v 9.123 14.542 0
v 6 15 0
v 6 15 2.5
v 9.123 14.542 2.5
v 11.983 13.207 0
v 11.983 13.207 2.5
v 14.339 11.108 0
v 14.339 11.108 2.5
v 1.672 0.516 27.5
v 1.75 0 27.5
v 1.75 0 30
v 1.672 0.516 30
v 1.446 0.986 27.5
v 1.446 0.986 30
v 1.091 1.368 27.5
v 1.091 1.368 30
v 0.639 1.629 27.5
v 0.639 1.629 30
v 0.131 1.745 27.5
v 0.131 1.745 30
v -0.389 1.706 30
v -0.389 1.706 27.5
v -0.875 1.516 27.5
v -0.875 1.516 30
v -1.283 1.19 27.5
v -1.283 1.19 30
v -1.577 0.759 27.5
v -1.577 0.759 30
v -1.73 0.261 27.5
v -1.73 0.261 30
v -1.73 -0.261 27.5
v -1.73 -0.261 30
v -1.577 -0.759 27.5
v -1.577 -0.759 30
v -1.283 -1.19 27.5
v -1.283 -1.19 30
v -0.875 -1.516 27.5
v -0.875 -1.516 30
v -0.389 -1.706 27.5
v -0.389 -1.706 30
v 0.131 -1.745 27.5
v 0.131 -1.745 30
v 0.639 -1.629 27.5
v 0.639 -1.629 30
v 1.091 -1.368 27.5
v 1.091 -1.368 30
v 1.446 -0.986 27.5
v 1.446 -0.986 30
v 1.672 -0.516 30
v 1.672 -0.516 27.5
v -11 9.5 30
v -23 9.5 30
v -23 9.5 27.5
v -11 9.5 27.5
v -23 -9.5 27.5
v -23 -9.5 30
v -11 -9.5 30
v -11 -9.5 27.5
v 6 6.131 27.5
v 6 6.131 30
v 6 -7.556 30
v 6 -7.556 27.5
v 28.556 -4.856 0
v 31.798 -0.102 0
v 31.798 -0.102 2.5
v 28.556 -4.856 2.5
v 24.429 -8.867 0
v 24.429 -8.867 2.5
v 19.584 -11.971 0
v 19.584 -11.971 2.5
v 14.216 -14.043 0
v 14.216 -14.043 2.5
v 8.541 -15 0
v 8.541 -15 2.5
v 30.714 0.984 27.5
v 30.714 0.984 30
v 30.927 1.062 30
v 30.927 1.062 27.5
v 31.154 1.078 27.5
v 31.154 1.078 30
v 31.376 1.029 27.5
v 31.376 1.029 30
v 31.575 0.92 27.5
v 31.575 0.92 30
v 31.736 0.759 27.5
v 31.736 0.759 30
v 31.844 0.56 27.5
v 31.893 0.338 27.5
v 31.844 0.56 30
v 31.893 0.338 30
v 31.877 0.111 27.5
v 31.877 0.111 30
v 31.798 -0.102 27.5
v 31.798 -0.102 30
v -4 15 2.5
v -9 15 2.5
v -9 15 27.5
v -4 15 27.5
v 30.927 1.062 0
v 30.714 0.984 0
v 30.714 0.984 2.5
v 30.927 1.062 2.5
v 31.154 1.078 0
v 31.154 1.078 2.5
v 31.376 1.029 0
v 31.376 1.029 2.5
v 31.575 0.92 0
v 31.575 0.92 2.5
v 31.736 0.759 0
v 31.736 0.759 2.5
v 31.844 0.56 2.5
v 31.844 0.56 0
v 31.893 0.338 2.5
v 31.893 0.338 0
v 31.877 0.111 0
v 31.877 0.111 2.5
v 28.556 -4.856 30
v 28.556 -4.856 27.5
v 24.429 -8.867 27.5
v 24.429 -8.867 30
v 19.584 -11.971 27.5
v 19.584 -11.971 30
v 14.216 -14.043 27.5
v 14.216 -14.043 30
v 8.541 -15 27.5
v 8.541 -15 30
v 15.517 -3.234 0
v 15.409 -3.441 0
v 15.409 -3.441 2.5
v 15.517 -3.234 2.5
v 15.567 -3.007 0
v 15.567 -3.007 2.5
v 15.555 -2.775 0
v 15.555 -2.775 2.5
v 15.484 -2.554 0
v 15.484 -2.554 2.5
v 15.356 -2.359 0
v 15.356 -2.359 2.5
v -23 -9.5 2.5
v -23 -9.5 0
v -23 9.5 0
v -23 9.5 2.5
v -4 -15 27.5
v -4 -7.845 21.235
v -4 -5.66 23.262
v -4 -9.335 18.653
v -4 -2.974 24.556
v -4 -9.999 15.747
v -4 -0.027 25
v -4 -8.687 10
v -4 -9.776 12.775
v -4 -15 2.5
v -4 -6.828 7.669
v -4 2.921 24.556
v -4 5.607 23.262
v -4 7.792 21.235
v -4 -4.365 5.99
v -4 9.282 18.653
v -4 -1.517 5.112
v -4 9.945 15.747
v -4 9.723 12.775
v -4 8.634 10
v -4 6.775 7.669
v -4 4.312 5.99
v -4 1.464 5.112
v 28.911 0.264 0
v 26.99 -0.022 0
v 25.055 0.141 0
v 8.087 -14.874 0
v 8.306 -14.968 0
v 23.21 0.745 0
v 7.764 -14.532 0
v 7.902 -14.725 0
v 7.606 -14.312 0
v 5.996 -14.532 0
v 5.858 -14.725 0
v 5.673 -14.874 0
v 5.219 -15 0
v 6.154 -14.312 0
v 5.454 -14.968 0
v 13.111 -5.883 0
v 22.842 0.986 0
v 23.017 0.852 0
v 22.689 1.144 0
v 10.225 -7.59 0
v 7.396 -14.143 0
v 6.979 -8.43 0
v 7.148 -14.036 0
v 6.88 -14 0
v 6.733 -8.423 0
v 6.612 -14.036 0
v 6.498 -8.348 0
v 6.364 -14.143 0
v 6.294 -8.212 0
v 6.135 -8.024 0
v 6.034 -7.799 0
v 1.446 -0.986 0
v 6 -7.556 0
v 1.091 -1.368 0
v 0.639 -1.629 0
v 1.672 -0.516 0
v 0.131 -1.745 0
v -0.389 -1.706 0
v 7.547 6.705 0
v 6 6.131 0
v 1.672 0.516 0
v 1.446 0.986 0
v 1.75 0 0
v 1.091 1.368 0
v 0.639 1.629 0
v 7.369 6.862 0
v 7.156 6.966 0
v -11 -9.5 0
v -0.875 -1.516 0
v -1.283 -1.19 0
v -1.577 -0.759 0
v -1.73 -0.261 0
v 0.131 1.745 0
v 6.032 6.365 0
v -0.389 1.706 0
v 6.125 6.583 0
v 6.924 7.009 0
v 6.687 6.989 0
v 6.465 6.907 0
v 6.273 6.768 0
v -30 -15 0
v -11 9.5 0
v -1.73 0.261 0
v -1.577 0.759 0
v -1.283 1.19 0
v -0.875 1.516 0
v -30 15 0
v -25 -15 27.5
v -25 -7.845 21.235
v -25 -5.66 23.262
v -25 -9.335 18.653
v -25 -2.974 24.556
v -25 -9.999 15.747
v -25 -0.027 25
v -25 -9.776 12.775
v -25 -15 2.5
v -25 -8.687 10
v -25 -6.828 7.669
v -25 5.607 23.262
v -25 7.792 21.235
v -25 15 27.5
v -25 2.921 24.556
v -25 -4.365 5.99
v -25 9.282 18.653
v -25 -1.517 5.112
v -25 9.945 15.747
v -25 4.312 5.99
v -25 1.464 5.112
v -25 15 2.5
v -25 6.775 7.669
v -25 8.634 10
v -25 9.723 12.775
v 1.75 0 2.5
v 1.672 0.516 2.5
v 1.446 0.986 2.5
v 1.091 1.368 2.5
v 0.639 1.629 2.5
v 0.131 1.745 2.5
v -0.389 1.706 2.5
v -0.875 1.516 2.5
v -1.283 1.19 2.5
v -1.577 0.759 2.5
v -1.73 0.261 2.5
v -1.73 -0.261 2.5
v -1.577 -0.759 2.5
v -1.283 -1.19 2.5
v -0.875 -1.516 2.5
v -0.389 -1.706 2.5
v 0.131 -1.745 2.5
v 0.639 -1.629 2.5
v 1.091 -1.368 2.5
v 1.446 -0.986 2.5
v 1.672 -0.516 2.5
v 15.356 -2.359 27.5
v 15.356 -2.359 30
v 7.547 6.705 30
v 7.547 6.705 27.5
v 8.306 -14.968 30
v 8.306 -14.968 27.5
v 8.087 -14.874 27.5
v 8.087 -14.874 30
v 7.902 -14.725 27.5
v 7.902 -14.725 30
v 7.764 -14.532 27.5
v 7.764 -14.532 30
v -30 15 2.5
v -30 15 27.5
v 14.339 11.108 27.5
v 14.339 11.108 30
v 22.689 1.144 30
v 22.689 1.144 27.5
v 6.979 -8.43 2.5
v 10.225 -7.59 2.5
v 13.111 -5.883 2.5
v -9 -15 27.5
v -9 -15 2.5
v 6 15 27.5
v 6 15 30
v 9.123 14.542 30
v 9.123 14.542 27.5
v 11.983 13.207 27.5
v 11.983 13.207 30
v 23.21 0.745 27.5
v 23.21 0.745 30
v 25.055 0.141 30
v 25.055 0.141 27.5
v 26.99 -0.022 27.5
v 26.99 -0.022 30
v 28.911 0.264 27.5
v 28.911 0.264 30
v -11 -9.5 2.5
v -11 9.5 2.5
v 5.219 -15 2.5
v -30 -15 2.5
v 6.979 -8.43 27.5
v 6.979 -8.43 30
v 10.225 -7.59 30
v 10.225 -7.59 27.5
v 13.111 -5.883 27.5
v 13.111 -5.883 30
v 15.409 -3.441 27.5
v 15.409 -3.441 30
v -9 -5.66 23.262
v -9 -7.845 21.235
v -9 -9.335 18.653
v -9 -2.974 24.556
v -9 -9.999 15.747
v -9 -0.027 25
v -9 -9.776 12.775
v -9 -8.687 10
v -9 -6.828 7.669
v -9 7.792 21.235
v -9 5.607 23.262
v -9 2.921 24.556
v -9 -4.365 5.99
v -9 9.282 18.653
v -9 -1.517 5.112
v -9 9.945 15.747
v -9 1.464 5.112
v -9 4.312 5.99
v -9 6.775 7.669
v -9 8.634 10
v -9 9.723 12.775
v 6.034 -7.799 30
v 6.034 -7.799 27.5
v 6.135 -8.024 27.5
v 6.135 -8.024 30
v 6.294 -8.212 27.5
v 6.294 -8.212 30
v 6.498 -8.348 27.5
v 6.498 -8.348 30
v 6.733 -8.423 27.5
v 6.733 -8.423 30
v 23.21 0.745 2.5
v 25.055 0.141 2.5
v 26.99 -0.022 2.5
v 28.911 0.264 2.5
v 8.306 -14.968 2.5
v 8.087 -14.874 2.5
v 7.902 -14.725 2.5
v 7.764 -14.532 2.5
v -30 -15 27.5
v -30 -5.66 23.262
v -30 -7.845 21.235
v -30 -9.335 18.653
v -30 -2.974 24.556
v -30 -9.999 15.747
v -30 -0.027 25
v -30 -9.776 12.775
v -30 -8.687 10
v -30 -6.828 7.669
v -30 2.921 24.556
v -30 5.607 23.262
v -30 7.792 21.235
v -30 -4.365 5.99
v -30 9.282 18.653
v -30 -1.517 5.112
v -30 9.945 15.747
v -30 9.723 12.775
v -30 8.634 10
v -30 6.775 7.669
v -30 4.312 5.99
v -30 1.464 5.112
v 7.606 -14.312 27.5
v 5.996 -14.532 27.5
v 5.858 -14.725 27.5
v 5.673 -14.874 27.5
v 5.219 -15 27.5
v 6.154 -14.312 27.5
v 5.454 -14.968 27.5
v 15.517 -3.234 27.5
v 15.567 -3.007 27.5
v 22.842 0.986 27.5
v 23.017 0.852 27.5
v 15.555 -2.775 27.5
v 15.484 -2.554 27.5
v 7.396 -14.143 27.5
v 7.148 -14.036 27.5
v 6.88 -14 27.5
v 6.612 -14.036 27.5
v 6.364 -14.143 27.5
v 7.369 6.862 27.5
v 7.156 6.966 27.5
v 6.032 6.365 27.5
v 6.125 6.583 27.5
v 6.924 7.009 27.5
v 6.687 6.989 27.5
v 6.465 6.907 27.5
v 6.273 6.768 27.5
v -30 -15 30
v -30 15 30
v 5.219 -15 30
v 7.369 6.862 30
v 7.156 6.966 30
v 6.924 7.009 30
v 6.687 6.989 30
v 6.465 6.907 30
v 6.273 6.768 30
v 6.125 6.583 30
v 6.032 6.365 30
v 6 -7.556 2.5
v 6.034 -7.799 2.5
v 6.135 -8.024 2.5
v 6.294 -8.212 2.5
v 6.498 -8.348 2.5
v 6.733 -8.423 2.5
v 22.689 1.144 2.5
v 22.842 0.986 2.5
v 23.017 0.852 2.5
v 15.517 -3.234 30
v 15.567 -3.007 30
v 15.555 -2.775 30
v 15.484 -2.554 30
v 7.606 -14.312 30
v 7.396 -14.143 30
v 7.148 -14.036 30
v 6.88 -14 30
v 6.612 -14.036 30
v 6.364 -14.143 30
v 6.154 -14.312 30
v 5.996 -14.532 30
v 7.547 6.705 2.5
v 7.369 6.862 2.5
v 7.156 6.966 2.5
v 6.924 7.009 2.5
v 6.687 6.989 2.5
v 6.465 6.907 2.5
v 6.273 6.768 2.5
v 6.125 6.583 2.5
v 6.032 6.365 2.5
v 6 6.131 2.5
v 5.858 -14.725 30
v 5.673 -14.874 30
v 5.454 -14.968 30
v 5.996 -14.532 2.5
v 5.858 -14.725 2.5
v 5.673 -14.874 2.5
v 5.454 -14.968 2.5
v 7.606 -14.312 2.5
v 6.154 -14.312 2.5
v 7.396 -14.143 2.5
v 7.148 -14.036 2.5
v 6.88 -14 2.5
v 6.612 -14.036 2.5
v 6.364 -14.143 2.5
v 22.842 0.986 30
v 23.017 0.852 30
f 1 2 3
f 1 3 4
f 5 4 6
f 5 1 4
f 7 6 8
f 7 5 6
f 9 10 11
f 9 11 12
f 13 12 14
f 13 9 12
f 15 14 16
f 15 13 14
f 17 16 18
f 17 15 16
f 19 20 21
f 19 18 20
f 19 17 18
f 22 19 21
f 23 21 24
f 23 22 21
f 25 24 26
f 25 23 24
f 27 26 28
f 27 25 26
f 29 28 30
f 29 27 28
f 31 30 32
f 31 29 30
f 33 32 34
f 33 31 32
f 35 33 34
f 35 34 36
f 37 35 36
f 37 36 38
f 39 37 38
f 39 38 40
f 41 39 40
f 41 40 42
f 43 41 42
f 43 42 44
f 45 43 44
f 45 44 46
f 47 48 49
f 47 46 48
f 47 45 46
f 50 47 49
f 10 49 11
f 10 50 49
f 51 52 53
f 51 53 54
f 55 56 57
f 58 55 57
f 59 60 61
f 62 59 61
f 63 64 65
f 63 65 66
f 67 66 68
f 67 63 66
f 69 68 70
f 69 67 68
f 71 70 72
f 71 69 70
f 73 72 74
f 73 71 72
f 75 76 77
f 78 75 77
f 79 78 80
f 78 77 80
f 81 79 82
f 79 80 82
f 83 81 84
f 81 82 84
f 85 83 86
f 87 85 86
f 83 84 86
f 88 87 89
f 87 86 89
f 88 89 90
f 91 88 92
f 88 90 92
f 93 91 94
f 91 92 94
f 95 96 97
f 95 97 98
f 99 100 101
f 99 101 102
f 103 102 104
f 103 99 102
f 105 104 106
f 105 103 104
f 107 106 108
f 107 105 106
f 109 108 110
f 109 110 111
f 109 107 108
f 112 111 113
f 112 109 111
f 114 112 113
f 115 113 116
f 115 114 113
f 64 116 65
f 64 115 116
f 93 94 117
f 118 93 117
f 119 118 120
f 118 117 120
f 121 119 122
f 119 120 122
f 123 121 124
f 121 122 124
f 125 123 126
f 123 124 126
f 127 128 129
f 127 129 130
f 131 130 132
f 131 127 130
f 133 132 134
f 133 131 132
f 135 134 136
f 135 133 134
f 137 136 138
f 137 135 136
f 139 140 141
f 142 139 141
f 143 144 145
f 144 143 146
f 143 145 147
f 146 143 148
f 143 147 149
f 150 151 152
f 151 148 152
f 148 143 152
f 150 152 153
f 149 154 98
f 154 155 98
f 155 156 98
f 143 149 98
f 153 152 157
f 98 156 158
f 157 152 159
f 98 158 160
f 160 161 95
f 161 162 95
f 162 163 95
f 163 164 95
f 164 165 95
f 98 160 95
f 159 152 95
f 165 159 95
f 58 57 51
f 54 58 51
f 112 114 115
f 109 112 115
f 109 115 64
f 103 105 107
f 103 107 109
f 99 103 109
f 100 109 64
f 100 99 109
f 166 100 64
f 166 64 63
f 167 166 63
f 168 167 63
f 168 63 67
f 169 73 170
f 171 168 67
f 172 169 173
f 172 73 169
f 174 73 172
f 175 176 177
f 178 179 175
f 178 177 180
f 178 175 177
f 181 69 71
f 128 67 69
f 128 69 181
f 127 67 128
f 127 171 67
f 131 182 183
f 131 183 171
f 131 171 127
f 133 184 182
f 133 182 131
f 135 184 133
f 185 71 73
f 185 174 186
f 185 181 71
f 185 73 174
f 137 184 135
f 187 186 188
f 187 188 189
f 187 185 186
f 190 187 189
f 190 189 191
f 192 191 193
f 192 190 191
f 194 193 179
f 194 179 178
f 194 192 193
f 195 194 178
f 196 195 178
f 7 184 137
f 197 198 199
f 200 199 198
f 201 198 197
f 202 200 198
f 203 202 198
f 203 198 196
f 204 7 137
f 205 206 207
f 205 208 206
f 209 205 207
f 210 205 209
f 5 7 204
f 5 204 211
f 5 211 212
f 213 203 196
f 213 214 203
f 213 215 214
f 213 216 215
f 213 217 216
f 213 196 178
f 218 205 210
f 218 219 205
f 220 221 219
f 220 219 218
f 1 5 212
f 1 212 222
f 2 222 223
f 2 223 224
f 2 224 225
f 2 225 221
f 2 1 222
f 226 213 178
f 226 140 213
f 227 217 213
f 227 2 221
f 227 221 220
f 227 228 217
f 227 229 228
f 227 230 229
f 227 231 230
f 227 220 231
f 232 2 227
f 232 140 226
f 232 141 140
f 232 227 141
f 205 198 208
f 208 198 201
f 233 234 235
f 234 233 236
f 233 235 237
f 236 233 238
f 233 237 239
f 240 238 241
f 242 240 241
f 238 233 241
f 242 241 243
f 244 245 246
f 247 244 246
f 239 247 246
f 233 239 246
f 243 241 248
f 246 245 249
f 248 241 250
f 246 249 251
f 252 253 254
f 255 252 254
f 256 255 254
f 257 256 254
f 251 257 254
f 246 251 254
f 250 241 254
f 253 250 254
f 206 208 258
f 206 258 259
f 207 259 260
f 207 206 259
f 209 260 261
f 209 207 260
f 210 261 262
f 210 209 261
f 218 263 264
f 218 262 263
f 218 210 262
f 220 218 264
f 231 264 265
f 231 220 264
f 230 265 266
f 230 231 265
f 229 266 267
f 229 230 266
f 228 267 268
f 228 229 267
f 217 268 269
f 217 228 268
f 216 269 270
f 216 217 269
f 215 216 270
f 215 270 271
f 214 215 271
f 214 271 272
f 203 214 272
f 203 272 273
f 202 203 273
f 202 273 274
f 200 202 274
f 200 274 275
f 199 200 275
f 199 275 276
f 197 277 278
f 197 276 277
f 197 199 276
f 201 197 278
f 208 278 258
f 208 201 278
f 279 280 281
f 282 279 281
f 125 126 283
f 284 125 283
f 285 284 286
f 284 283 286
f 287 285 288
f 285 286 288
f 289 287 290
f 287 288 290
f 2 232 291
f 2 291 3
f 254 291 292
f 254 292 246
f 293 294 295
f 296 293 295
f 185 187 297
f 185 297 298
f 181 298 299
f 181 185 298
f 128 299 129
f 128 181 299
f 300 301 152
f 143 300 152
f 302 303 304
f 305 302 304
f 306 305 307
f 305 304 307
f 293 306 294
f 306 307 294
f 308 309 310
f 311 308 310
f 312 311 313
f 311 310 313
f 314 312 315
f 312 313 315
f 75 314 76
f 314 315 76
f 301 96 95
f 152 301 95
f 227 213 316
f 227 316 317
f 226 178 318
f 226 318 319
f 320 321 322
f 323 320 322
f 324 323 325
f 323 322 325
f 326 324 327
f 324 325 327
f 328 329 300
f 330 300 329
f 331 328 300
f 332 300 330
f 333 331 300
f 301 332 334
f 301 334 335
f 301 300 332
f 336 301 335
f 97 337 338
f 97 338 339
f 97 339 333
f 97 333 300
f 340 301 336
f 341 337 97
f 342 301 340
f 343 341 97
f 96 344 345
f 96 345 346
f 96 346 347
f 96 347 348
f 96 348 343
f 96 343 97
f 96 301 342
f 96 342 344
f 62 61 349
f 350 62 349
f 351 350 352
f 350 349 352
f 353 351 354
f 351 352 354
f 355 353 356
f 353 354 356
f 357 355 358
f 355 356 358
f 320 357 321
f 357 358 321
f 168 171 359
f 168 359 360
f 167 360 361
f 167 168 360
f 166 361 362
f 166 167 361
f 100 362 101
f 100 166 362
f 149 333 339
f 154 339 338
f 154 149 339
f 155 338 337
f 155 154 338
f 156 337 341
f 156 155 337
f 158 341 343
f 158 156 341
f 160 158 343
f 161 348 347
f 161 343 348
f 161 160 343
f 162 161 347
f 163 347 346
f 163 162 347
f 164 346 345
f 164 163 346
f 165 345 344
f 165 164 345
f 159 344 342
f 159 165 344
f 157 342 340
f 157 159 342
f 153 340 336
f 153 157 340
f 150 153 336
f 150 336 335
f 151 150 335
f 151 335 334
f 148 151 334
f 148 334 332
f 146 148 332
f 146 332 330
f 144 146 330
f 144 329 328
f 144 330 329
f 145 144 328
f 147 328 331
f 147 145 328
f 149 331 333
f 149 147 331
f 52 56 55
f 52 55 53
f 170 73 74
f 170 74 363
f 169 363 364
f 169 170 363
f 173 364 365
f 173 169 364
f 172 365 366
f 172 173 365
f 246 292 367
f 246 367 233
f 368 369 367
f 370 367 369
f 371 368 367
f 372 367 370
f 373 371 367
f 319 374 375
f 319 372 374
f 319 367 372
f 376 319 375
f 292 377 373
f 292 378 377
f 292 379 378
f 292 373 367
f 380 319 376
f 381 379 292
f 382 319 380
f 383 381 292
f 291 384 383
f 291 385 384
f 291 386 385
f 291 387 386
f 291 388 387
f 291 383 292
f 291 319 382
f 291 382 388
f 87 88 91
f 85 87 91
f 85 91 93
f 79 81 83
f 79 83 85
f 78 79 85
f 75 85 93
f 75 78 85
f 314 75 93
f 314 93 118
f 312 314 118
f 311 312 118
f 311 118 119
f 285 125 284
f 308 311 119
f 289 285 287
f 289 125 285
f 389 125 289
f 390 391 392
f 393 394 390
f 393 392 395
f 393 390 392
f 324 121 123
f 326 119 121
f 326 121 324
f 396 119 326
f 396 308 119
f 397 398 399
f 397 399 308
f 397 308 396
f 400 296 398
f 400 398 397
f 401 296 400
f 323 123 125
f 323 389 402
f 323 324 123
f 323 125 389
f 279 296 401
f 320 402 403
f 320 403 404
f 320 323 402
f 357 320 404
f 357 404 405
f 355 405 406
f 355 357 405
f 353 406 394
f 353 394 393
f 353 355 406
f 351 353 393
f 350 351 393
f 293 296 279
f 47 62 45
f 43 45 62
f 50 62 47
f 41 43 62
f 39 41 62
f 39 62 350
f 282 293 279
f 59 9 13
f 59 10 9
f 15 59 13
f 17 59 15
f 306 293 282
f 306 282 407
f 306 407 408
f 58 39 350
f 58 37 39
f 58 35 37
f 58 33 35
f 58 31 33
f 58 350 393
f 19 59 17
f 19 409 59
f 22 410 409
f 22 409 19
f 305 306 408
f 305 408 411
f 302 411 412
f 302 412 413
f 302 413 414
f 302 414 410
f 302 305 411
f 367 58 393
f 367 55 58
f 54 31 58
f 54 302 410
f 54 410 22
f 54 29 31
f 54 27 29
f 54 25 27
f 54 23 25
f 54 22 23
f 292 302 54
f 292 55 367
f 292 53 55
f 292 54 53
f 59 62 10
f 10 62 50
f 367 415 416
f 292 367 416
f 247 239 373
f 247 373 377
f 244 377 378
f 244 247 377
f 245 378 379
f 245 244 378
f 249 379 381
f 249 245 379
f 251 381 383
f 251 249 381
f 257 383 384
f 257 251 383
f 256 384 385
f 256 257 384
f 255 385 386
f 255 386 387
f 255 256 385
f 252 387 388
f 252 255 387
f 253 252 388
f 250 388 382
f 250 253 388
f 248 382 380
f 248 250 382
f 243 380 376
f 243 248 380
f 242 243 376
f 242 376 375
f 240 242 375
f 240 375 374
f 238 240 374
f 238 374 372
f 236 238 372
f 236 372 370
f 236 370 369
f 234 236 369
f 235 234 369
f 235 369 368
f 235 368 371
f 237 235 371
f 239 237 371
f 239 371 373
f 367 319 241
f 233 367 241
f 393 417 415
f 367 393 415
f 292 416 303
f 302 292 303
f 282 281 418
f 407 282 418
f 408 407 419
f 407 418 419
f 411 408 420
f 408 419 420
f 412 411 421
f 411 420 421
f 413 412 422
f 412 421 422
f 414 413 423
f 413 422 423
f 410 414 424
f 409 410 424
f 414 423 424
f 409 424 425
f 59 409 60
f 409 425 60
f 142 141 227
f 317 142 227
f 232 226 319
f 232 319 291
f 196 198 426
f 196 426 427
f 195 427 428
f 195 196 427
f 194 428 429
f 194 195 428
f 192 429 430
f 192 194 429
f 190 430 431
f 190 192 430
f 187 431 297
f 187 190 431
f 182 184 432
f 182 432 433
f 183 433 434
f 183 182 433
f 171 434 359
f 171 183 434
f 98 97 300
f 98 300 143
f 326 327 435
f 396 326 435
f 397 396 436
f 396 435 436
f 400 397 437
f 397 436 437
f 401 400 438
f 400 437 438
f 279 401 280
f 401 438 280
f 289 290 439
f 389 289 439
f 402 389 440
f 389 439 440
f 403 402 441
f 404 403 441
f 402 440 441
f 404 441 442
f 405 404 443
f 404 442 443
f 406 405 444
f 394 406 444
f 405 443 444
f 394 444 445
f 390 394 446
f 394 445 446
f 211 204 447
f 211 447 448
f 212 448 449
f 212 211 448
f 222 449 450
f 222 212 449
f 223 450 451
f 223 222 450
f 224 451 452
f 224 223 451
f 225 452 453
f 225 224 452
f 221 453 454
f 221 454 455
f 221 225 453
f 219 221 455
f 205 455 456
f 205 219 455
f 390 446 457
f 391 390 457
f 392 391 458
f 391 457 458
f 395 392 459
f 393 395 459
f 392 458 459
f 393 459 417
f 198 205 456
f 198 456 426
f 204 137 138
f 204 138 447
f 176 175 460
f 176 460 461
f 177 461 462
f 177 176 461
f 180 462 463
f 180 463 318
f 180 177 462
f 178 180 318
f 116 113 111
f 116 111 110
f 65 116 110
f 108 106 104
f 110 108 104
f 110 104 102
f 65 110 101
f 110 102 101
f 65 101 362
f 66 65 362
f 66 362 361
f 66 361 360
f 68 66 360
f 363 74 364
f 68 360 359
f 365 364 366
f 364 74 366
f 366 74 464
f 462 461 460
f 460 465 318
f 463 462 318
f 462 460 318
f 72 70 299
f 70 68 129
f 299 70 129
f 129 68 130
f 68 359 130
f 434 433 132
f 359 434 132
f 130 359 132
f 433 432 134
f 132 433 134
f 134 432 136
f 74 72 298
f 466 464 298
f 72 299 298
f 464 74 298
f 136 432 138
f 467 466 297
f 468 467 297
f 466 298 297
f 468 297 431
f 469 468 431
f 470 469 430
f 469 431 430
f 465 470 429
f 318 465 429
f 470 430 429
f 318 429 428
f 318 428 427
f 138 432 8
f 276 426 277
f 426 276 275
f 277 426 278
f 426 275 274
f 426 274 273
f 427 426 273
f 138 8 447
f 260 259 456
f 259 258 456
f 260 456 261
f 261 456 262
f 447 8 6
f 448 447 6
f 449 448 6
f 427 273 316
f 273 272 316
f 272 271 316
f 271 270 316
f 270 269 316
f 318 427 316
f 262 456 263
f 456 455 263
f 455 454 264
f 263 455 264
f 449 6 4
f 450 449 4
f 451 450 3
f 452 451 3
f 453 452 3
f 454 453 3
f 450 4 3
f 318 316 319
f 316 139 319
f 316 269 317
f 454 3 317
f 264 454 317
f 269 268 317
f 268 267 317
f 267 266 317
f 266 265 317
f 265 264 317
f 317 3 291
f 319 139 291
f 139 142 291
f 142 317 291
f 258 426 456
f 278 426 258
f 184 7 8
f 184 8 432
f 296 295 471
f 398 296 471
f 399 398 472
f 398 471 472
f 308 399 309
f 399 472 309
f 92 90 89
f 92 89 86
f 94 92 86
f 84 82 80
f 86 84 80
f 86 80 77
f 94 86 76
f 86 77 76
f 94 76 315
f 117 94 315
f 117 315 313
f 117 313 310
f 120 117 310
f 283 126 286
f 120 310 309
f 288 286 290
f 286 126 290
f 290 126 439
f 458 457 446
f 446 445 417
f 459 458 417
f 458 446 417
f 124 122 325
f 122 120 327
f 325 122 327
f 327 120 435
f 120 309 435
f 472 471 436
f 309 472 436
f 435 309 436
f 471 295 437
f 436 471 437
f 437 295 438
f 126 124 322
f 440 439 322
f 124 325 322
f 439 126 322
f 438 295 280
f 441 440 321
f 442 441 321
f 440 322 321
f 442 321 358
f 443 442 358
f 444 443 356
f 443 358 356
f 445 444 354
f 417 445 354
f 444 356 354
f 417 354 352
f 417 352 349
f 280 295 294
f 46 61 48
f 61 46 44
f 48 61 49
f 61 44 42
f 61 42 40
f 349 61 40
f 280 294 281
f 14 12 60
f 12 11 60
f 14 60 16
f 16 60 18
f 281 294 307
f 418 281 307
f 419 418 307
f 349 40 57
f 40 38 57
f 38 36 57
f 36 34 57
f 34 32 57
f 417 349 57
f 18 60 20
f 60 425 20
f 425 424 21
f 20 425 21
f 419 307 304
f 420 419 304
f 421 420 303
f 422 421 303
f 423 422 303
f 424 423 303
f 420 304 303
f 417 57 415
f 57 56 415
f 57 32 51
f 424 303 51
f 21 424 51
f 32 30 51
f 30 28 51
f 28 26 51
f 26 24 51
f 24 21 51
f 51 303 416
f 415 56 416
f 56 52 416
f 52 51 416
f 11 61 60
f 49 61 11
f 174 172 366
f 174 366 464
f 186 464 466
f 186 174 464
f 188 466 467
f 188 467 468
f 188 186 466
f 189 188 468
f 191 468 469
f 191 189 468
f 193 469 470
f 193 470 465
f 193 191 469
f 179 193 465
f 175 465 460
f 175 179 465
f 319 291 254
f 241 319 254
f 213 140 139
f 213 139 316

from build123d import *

# Parameters (mm, degrees)
SKETCH1_W               = 12
SKETCH1_H               = 19
BOSS_EXTRUDE1_DEPTH     = 2.5
SKETCH2_W               = 5
SKETCH2_H               = 30
BOSS_EXTRUDE2_DEPTH     = 25
BOSS_EXTRUDE2_2_DEPTH   = 25
CUT_EXTRUDE1_START      = -26
SKETCH3_R               = 10
CUT_EXTRUDE1_DEPTH      = 26
CUT_EXTRUDE2_DEPTH      = 39.305093566
CUT_EXTRUDE2_DEPTH_BACK = 39.305093566
SKETCH4_R               = 1.75


with BuildPart() as part:
    # Sketch1 → Boss-Extrude1 (new body)
    with BuildSketch(Plane.XY):
        with BuildLine():
            Line((5.218675227, -15), (-30, -15))
            Line((-30, -15), (-30, 15))
            Line((-30, 15), (6, 15))
            ThreePointArc((6, 15), (10.601443669, 13.979062641), (14.339323781, 11.107852236))
            Line((14.339323781, 11.107852236), (22.688779578, 1.143586689))
            ThreePointArc((22.688779578, 1.143586689), (22.927337997, 0.915440554), (23.210021393, 0.744997378))
            ThreePointArc((23.210021393, 0.744997378), (26.990294912, -0.022324307), (30.714135867, 0.983786514))
            ThreePointArc((30.714135867, 0.983786514), (31.661011891, 0.845361822), (31.797774266, -0.101755727))
            ThreePointArc((31.797774266, -0.101755727), (22.084906112, -10.540786811), (8.541324773, -15))
            ThreePointArc((8.541324773, -15), (8.087499424, -14.873951294), (7.76368339, -14.531914894))
            ThreePointArc((7.76368339, -14.531914894), (6.88, -14), (5.99631661, -14.531914894))
            ThreePointArc((5.99631661, -14.531914894), (5.672500576, -14.873951294), (5.218675227, -15))
        make_face()
        with Locations((-17, 0)):
            Rectangle(SKETCH1_W, SKETCH1_H, mode=Mode.SUBTRACT)
        with BuildLine():
            Line((6, 6.130536766), (6, -7.555592076))
            ThreePointArc((6, -7.555592076), (6.293680971, -8.211816121), (6.978704537, -8.430038996))
            ThreePointArc((6.978704537, -8.430038996), (11.728100272, -6.838146724), (15.40876192, -3.440557773))
            ThreePointArc((15.40876192, -3.440557773), (15.568644863, -2.890698084), (15.356341606, -2.358875218))
            Line((15.356341606, -2.358875218), (7.546665198, 6.70495605))
            ThreePointArc((7.546665198, 6.70495605), (6.573622271, 6.955480817), (6, 6.130536766))
        make_face(mode=Mode.SUBTRACT)
    extrude(amount=BOSS_EXTRUDE1_DEPTH)


with BuildPart() as body_2:
    # Sketch2 → Boss-Extrude2 (new body)
    with BuildSketch(Plane.XY.offset(2.5)):
        with Locations((-27.5, 0)):
            Rectangle(SKETCH2_W, SKETCH2_H)
    extrude(amount=BOSS_EXTRUDE2_DEPTH)


with BuildPart() as body_3:
    # Sketch2 → Boss-Extrude2 2 (new body)
    with BuildSketch(Plane.XY.offset(2.5)):
        with Locations((-6.5, 0)):
            Rectangle(SKETCH2_W, SKETCH2_H)
    extrude(amount=BOSS_EXTRUDE2_2_DEPTH)


with BuildPart() as body_4:
    # Mirror3: mirrored copy
    add(part.part.mirror(Plane.XY.offset(15)))


with BuildPart() as cut_extrude1_tool:
    # Sketch3 → Cut-Extrude1 (new body)
    with BuildSketch(Plane.ZY.offset(30).offset(CUT_EXTRUDE1_START)):
        with Locations((15, -0.026566761)):
            Circle(SKETCH3_R)
    extrude(amount=CUT_EXTRUDE1_DEPTH)


with BuildPart() as body_2_1:
    add(body_2.part)

    # Cut-Extrude1: cut by cut_extrude1_tool
    add(cut_extrude1_tool.part, mode=Mode.SUBTRACT)


with BuildPart() as body_3_1:
    add(body_3.part)

    # Cut-Extrude1: cut by cut_extrude1_tool
    add(cut_extrude1_tool.part, mode=Mode.SUBTRACT)


with BuildPart() as cut_extrude2_tool:
    # Sketch4 → Cut-Extrude2 (new, two sides: drawn at the far end of the back side and taken through both)
    with BuildSketch(Plane.XY.offset(15).offset(-CUT_EXTRUDE2_DEPTH_BACK)):
        Circle(SKETCH4_R)
    extrude(amount=CUT_EXTRUDE2_DEPTH + CUT_EXTRUDE2_DEPTH_BACK)


with BuildPart() as part_1:
    add(part.part)

    # Cut-Extrude2: cut by cut_extrude2_tool
    add(cut_extrude2_tool.part, mode=Mode.SUBTRACT)


with BuildPart() as body_4_1:
    add(body_4.part)

    # Cut-Extrude2: cut by cut_extrude2_tool
    add(cut_extrude2_tool.part, mode=Mode.SUBTRACT)


solid = Compound([body_2_1.part, body_3_1.part, part_1.part, body_4_1.part])
